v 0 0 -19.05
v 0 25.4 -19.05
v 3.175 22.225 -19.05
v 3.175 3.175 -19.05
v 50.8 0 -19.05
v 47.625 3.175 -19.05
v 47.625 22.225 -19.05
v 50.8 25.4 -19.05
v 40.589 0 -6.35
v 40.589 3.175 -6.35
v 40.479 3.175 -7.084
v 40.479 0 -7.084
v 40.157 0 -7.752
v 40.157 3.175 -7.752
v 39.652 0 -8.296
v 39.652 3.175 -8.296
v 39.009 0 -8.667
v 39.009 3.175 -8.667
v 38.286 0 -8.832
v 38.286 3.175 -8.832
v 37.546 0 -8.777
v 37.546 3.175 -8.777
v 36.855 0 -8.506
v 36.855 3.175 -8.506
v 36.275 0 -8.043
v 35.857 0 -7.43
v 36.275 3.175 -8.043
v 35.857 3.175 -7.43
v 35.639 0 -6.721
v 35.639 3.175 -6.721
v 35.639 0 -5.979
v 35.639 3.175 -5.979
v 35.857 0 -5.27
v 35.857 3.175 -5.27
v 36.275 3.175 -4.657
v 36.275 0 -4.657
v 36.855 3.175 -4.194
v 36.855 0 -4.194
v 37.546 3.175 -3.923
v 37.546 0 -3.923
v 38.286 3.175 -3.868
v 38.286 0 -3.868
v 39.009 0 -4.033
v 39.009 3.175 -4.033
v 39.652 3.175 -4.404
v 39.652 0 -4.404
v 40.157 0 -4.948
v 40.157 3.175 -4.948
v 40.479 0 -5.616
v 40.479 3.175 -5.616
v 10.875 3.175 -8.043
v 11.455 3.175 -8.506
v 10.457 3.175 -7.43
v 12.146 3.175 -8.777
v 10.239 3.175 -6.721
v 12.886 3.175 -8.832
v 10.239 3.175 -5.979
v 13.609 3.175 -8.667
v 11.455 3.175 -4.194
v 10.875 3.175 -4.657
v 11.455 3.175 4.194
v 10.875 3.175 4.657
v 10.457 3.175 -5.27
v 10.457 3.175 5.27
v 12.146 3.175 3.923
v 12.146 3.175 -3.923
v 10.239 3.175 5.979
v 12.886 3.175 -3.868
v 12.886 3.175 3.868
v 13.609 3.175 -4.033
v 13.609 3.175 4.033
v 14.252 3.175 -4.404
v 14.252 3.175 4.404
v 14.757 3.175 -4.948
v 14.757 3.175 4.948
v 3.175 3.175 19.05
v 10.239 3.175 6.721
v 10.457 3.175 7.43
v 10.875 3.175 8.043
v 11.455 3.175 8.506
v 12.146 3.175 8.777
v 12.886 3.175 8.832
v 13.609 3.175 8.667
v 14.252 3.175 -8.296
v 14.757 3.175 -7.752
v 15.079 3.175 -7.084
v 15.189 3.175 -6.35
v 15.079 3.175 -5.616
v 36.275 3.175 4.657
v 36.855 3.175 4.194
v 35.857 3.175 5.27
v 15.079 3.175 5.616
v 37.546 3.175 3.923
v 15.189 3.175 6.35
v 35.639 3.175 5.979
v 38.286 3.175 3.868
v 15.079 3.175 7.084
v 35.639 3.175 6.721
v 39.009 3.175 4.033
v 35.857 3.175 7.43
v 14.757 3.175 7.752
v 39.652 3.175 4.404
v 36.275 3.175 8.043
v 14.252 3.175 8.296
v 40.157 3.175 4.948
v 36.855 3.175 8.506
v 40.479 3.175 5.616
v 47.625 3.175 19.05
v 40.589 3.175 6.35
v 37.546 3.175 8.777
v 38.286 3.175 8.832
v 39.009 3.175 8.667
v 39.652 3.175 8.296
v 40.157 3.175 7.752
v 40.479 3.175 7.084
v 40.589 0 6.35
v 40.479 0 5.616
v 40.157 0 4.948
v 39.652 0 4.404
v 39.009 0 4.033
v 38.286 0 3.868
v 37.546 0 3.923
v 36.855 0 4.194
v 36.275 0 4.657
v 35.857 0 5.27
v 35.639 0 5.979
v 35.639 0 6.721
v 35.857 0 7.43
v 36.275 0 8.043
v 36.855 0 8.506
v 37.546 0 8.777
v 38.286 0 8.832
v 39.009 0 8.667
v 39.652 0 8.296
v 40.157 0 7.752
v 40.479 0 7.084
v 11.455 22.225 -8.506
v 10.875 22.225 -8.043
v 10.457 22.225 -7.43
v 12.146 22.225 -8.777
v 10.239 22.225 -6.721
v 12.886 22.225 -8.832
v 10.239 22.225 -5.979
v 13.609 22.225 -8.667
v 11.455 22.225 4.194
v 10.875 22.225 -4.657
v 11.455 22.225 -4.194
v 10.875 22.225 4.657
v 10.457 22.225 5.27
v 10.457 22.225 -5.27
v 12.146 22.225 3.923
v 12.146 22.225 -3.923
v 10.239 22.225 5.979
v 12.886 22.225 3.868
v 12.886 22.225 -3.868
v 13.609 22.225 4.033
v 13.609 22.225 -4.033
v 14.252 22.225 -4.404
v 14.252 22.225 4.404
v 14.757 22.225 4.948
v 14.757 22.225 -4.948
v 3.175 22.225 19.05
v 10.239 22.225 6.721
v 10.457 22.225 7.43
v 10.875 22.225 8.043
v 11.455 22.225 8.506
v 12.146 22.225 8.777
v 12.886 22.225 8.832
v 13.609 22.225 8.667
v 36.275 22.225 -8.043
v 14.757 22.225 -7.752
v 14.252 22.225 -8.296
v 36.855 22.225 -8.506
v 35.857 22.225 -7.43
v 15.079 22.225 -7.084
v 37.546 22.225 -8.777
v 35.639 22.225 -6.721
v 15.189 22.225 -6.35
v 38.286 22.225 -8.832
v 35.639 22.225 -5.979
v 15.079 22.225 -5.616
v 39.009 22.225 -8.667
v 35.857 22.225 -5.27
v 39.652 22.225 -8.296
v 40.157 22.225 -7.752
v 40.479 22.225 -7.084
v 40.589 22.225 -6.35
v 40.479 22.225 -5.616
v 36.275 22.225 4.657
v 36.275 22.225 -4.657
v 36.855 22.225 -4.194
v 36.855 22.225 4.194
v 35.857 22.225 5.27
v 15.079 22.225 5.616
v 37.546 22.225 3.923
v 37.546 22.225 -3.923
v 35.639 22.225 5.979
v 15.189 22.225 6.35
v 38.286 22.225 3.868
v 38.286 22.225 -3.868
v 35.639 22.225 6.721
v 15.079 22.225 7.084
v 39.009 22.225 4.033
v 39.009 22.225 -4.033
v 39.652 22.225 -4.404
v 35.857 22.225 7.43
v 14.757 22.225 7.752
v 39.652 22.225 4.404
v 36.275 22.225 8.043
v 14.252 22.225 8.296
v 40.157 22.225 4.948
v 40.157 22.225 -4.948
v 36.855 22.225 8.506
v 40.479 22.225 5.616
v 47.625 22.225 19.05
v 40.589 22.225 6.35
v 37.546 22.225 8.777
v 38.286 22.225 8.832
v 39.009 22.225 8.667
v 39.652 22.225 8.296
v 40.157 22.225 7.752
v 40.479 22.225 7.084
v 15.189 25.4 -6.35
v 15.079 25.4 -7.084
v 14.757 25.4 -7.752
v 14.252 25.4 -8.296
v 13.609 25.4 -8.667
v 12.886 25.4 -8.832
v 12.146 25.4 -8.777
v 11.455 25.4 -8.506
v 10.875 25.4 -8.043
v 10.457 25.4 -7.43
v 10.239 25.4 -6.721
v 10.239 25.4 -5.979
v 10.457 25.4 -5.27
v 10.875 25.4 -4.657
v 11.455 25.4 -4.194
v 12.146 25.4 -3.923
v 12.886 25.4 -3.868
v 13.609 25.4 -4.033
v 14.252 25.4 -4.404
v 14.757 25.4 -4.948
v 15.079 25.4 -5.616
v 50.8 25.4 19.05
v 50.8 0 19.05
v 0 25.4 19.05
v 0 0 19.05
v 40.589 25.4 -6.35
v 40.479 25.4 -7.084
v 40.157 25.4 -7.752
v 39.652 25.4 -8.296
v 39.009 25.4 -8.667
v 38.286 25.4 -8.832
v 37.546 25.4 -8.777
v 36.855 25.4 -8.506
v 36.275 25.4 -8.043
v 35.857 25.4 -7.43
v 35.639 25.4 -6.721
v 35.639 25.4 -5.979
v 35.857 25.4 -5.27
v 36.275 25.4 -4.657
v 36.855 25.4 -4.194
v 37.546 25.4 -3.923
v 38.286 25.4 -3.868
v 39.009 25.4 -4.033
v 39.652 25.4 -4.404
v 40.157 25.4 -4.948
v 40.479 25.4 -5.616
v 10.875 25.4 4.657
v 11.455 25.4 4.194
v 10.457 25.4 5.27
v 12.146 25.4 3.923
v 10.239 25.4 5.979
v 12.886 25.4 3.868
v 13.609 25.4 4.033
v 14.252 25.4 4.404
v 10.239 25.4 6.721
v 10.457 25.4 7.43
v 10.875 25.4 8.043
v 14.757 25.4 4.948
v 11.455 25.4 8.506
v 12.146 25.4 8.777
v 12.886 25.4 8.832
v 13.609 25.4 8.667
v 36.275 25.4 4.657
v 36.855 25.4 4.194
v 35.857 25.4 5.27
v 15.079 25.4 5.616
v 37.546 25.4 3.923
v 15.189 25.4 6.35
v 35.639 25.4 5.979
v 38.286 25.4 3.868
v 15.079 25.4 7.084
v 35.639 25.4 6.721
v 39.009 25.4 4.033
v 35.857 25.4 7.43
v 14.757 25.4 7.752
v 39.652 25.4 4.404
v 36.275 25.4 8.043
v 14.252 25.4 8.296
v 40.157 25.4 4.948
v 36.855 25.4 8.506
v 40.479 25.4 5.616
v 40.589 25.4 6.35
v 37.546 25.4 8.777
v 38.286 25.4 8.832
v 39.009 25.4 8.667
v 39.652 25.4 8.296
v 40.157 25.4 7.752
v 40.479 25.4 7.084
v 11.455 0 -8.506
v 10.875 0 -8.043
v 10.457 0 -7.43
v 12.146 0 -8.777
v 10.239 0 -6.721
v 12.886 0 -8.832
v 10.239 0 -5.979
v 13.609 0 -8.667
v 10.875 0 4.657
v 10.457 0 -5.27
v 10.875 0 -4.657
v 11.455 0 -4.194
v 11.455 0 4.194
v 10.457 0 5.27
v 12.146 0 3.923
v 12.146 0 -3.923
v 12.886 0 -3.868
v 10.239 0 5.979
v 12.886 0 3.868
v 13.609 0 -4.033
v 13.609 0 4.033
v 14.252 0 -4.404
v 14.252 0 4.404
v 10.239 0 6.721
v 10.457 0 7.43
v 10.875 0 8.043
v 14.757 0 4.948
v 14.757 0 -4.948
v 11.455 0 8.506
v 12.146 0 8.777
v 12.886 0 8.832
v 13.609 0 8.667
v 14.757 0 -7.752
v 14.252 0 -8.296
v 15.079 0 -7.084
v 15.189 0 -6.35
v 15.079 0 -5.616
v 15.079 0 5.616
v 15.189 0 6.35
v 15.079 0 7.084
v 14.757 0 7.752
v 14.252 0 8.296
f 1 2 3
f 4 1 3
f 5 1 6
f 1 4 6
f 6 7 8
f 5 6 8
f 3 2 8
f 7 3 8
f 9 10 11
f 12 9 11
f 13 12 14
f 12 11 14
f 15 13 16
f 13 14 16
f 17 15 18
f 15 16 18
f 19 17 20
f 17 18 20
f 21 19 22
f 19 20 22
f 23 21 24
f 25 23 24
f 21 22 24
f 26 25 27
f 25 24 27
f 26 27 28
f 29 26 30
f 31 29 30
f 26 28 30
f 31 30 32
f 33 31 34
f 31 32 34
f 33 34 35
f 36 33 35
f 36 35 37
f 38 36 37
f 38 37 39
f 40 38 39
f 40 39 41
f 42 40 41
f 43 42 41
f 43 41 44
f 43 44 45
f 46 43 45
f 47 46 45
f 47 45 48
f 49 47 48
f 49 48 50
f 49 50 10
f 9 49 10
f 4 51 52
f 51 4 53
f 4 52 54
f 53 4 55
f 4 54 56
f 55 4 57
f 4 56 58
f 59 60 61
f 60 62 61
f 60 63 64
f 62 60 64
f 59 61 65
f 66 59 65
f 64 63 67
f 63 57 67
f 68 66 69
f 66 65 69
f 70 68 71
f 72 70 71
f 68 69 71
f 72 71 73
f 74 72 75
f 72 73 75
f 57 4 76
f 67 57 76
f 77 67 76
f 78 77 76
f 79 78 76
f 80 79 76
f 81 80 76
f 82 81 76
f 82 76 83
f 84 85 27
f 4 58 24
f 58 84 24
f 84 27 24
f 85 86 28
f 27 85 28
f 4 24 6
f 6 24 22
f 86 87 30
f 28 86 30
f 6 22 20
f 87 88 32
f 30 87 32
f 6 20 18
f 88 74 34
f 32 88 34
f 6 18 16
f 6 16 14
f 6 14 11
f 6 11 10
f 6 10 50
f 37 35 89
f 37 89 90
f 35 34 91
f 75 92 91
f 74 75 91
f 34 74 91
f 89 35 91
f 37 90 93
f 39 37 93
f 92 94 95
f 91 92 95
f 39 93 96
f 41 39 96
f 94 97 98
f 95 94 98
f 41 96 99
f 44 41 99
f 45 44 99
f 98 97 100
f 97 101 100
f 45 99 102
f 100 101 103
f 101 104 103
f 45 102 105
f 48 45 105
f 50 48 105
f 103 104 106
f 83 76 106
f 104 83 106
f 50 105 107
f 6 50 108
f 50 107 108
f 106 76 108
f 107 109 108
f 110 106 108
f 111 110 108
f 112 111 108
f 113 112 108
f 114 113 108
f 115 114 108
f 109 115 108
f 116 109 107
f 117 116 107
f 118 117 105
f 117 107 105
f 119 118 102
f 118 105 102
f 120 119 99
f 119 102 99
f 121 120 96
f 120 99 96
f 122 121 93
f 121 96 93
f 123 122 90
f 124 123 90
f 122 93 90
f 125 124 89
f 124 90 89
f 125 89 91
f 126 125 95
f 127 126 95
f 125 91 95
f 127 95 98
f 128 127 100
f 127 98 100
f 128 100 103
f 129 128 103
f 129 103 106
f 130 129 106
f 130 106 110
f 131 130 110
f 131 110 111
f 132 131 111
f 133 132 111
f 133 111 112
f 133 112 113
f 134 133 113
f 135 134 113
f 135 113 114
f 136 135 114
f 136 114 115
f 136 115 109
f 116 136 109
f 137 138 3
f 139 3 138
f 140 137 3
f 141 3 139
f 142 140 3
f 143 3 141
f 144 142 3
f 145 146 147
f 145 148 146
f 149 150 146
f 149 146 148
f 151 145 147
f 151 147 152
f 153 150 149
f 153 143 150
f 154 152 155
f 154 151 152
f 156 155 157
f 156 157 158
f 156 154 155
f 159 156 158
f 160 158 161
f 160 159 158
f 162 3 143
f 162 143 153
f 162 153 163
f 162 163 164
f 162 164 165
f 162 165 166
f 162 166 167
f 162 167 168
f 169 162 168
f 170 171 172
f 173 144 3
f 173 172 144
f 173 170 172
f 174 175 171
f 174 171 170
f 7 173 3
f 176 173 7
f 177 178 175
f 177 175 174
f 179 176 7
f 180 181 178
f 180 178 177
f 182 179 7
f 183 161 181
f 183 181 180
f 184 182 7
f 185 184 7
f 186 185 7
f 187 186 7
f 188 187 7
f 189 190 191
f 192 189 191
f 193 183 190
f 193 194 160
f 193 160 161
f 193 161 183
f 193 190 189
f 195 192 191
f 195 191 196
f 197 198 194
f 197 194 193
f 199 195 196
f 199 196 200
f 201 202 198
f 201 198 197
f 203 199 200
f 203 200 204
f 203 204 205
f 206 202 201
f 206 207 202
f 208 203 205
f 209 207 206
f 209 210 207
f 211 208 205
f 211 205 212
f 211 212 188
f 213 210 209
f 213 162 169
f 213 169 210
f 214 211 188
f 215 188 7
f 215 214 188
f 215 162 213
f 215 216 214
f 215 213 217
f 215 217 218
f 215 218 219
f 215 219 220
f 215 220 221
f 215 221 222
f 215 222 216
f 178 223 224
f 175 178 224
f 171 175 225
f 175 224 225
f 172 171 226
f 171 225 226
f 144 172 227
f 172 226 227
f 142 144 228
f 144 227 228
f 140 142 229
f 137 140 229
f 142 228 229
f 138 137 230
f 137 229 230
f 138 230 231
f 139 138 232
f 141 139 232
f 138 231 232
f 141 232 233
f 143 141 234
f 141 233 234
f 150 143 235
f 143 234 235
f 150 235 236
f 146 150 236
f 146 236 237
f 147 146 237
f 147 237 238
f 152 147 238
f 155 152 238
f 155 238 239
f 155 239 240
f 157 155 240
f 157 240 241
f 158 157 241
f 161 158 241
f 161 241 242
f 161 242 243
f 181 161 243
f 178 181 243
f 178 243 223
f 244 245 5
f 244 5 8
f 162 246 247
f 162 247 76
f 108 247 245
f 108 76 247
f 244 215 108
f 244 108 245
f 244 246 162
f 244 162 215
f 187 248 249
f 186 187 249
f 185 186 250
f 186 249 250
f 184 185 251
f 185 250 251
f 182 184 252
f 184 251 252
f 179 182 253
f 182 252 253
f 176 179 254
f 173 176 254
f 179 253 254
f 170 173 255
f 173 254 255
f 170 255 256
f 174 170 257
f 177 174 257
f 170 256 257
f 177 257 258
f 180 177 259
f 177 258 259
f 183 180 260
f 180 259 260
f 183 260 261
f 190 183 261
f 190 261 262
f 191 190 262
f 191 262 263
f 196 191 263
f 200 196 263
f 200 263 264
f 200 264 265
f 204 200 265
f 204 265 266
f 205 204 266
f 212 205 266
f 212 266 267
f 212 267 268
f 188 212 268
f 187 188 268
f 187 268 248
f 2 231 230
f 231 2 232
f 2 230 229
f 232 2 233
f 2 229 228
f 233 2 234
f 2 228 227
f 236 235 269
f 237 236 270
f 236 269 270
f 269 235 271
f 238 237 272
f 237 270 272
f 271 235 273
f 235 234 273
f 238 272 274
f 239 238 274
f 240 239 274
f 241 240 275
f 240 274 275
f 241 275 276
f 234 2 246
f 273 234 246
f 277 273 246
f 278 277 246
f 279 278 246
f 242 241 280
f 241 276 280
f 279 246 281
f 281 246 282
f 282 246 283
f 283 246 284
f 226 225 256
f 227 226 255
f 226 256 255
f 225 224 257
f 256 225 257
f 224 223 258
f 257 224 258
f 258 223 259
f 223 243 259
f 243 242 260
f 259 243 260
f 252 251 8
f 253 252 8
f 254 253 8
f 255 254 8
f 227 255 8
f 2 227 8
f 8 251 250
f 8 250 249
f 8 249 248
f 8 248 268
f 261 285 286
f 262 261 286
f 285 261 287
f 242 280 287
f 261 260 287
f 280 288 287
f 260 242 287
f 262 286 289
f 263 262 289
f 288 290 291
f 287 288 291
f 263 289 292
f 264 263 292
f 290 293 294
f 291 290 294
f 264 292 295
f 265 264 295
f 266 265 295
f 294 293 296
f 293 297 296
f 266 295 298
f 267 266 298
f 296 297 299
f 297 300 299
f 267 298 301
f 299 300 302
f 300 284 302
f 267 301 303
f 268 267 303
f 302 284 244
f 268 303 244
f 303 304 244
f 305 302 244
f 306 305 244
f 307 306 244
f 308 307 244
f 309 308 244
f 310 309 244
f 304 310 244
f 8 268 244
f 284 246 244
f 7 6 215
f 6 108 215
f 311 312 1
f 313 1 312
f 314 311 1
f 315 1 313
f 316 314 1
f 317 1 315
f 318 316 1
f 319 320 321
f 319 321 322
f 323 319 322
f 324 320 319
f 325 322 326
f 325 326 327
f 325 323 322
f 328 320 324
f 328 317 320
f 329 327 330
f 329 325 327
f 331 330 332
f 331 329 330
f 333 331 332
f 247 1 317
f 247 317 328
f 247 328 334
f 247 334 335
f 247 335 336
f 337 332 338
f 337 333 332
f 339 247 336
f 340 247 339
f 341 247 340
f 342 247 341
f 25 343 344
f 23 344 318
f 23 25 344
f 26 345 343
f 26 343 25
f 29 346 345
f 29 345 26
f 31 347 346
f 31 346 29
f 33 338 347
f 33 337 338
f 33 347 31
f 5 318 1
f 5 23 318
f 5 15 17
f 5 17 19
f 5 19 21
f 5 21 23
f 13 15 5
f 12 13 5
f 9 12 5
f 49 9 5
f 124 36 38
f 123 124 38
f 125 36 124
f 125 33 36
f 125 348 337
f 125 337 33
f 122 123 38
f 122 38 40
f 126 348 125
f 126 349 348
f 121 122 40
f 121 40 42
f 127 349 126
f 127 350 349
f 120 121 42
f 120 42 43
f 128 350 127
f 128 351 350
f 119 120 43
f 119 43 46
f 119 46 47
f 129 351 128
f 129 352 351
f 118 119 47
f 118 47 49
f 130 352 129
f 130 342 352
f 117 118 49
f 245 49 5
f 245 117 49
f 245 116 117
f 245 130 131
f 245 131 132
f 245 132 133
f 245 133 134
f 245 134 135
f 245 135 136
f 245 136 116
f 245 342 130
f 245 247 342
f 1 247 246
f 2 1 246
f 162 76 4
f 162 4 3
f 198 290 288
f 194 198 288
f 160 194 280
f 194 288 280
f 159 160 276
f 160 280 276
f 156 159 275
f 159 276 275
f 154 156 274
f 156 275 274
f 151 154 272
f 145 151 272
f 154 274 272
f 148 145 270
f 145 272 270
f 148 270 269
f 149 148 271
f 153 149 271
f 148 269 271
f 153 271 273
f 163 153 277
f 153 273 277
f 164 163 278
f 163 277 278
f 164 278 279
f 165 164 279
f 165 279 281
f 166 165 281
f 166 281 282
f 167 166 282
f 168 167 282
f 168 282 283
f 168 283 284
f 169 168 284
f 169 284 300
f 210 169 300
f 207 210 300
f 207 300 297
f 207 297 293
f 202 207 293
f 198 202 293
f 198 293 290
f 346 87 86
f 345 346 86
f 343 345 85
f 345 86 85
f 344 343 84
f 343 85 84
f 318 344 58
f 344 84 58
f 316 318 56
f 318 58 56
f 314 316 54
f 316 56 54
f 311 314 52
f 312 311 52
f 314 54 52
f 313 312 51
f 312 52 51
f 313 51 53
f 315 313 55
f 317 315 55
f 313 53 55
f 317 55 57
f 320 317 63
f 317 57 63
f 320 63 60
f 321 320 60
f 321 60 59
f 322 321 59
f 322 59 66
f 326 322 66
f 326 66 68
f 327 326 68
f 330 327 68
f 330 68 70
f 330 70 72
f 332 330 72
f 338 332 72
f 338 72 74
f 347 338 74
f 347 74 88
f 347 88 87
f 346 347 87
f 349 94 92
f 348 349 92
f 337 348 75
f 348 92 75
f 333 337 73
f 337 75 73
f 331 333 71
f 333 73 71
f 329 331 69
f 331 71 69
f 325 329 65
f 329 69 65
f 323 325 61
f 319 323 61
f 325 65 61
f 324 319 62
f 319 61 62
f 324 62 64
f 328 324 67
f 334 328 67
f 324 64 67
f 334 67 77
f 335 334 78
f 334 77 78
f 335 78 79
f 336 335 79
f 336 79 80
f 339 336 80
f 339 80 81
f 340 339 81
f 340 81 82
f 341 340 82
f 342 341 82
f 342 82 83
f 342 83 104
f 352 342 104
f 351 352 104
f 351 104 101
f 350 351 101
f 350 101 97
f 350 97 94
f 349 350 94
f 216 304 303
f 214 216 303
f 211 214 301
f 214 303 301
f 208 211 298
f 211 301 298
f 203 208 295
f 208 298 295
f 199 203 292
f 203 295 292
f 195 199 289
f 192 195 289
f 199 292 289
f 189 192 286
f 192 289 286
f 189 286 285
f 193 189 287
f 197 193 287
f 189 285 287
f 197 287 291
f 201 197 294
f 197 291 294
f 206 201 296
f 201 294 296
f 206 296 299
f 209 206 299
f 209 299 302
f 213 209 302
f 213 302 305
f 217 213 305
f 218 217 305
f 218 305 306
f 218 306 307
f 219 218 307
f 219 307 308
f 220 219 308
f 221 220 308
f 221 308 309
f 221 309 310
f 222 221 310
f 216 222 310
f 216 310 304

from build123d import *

# Parameters (mm, degrees)
SKETCH1_W           = 50.8
SKETCH1_H           = 25.4
SKETCH1_W_2         = 44.45
SKETCH1_H_2         = 19.05
EXTRUDE_THIN1_DEPTH = 19.05
SKETCH2_R           = 2.4892
CUT_EXTRUDE1_DEPTH  = 26.4


with BuildPart() as part:
    # Sketch1 → Extrude-Thin1 (new body, symmetric)
    with BuildSketch(Plane.XY):
        with Locations((25.4, 12.7)):
            Rectangle(SKETCH1_W, SKETCH1_H)
        with Locations((25.4, 12.7)):
            Rectangle(SKETCH1_W_2, SKETCH1_H_2, mode=Mode.SUBTRACT)
    extrude(amount=EXTRUDE_THIN1_DEPTH, both=True)

    # Sketch2 → Cut-Extrude1 (cut, through all)
    with BuildSketch(Plane(origin=(0, 25.4, 0), x_dir=(1, 0, 0), z_dir=(0, 1, 0))):
        with Locations((38.1, 6.35)):
            Circle(SKETCH2_R)
        with Locations((38.1, -6.35)):
            Circle(SKETCH2_R)
        with Locations((12.7, -6.35)):
            Circle(SKETCH2_R)
        with Locations((12.7, 6.35)):
            Circle(SKETCH2_R)
    extrude(amount=-CUT_EXTRUDE1_DEPTH, mode=Mode.SUBTRACT)


solid = part.part
